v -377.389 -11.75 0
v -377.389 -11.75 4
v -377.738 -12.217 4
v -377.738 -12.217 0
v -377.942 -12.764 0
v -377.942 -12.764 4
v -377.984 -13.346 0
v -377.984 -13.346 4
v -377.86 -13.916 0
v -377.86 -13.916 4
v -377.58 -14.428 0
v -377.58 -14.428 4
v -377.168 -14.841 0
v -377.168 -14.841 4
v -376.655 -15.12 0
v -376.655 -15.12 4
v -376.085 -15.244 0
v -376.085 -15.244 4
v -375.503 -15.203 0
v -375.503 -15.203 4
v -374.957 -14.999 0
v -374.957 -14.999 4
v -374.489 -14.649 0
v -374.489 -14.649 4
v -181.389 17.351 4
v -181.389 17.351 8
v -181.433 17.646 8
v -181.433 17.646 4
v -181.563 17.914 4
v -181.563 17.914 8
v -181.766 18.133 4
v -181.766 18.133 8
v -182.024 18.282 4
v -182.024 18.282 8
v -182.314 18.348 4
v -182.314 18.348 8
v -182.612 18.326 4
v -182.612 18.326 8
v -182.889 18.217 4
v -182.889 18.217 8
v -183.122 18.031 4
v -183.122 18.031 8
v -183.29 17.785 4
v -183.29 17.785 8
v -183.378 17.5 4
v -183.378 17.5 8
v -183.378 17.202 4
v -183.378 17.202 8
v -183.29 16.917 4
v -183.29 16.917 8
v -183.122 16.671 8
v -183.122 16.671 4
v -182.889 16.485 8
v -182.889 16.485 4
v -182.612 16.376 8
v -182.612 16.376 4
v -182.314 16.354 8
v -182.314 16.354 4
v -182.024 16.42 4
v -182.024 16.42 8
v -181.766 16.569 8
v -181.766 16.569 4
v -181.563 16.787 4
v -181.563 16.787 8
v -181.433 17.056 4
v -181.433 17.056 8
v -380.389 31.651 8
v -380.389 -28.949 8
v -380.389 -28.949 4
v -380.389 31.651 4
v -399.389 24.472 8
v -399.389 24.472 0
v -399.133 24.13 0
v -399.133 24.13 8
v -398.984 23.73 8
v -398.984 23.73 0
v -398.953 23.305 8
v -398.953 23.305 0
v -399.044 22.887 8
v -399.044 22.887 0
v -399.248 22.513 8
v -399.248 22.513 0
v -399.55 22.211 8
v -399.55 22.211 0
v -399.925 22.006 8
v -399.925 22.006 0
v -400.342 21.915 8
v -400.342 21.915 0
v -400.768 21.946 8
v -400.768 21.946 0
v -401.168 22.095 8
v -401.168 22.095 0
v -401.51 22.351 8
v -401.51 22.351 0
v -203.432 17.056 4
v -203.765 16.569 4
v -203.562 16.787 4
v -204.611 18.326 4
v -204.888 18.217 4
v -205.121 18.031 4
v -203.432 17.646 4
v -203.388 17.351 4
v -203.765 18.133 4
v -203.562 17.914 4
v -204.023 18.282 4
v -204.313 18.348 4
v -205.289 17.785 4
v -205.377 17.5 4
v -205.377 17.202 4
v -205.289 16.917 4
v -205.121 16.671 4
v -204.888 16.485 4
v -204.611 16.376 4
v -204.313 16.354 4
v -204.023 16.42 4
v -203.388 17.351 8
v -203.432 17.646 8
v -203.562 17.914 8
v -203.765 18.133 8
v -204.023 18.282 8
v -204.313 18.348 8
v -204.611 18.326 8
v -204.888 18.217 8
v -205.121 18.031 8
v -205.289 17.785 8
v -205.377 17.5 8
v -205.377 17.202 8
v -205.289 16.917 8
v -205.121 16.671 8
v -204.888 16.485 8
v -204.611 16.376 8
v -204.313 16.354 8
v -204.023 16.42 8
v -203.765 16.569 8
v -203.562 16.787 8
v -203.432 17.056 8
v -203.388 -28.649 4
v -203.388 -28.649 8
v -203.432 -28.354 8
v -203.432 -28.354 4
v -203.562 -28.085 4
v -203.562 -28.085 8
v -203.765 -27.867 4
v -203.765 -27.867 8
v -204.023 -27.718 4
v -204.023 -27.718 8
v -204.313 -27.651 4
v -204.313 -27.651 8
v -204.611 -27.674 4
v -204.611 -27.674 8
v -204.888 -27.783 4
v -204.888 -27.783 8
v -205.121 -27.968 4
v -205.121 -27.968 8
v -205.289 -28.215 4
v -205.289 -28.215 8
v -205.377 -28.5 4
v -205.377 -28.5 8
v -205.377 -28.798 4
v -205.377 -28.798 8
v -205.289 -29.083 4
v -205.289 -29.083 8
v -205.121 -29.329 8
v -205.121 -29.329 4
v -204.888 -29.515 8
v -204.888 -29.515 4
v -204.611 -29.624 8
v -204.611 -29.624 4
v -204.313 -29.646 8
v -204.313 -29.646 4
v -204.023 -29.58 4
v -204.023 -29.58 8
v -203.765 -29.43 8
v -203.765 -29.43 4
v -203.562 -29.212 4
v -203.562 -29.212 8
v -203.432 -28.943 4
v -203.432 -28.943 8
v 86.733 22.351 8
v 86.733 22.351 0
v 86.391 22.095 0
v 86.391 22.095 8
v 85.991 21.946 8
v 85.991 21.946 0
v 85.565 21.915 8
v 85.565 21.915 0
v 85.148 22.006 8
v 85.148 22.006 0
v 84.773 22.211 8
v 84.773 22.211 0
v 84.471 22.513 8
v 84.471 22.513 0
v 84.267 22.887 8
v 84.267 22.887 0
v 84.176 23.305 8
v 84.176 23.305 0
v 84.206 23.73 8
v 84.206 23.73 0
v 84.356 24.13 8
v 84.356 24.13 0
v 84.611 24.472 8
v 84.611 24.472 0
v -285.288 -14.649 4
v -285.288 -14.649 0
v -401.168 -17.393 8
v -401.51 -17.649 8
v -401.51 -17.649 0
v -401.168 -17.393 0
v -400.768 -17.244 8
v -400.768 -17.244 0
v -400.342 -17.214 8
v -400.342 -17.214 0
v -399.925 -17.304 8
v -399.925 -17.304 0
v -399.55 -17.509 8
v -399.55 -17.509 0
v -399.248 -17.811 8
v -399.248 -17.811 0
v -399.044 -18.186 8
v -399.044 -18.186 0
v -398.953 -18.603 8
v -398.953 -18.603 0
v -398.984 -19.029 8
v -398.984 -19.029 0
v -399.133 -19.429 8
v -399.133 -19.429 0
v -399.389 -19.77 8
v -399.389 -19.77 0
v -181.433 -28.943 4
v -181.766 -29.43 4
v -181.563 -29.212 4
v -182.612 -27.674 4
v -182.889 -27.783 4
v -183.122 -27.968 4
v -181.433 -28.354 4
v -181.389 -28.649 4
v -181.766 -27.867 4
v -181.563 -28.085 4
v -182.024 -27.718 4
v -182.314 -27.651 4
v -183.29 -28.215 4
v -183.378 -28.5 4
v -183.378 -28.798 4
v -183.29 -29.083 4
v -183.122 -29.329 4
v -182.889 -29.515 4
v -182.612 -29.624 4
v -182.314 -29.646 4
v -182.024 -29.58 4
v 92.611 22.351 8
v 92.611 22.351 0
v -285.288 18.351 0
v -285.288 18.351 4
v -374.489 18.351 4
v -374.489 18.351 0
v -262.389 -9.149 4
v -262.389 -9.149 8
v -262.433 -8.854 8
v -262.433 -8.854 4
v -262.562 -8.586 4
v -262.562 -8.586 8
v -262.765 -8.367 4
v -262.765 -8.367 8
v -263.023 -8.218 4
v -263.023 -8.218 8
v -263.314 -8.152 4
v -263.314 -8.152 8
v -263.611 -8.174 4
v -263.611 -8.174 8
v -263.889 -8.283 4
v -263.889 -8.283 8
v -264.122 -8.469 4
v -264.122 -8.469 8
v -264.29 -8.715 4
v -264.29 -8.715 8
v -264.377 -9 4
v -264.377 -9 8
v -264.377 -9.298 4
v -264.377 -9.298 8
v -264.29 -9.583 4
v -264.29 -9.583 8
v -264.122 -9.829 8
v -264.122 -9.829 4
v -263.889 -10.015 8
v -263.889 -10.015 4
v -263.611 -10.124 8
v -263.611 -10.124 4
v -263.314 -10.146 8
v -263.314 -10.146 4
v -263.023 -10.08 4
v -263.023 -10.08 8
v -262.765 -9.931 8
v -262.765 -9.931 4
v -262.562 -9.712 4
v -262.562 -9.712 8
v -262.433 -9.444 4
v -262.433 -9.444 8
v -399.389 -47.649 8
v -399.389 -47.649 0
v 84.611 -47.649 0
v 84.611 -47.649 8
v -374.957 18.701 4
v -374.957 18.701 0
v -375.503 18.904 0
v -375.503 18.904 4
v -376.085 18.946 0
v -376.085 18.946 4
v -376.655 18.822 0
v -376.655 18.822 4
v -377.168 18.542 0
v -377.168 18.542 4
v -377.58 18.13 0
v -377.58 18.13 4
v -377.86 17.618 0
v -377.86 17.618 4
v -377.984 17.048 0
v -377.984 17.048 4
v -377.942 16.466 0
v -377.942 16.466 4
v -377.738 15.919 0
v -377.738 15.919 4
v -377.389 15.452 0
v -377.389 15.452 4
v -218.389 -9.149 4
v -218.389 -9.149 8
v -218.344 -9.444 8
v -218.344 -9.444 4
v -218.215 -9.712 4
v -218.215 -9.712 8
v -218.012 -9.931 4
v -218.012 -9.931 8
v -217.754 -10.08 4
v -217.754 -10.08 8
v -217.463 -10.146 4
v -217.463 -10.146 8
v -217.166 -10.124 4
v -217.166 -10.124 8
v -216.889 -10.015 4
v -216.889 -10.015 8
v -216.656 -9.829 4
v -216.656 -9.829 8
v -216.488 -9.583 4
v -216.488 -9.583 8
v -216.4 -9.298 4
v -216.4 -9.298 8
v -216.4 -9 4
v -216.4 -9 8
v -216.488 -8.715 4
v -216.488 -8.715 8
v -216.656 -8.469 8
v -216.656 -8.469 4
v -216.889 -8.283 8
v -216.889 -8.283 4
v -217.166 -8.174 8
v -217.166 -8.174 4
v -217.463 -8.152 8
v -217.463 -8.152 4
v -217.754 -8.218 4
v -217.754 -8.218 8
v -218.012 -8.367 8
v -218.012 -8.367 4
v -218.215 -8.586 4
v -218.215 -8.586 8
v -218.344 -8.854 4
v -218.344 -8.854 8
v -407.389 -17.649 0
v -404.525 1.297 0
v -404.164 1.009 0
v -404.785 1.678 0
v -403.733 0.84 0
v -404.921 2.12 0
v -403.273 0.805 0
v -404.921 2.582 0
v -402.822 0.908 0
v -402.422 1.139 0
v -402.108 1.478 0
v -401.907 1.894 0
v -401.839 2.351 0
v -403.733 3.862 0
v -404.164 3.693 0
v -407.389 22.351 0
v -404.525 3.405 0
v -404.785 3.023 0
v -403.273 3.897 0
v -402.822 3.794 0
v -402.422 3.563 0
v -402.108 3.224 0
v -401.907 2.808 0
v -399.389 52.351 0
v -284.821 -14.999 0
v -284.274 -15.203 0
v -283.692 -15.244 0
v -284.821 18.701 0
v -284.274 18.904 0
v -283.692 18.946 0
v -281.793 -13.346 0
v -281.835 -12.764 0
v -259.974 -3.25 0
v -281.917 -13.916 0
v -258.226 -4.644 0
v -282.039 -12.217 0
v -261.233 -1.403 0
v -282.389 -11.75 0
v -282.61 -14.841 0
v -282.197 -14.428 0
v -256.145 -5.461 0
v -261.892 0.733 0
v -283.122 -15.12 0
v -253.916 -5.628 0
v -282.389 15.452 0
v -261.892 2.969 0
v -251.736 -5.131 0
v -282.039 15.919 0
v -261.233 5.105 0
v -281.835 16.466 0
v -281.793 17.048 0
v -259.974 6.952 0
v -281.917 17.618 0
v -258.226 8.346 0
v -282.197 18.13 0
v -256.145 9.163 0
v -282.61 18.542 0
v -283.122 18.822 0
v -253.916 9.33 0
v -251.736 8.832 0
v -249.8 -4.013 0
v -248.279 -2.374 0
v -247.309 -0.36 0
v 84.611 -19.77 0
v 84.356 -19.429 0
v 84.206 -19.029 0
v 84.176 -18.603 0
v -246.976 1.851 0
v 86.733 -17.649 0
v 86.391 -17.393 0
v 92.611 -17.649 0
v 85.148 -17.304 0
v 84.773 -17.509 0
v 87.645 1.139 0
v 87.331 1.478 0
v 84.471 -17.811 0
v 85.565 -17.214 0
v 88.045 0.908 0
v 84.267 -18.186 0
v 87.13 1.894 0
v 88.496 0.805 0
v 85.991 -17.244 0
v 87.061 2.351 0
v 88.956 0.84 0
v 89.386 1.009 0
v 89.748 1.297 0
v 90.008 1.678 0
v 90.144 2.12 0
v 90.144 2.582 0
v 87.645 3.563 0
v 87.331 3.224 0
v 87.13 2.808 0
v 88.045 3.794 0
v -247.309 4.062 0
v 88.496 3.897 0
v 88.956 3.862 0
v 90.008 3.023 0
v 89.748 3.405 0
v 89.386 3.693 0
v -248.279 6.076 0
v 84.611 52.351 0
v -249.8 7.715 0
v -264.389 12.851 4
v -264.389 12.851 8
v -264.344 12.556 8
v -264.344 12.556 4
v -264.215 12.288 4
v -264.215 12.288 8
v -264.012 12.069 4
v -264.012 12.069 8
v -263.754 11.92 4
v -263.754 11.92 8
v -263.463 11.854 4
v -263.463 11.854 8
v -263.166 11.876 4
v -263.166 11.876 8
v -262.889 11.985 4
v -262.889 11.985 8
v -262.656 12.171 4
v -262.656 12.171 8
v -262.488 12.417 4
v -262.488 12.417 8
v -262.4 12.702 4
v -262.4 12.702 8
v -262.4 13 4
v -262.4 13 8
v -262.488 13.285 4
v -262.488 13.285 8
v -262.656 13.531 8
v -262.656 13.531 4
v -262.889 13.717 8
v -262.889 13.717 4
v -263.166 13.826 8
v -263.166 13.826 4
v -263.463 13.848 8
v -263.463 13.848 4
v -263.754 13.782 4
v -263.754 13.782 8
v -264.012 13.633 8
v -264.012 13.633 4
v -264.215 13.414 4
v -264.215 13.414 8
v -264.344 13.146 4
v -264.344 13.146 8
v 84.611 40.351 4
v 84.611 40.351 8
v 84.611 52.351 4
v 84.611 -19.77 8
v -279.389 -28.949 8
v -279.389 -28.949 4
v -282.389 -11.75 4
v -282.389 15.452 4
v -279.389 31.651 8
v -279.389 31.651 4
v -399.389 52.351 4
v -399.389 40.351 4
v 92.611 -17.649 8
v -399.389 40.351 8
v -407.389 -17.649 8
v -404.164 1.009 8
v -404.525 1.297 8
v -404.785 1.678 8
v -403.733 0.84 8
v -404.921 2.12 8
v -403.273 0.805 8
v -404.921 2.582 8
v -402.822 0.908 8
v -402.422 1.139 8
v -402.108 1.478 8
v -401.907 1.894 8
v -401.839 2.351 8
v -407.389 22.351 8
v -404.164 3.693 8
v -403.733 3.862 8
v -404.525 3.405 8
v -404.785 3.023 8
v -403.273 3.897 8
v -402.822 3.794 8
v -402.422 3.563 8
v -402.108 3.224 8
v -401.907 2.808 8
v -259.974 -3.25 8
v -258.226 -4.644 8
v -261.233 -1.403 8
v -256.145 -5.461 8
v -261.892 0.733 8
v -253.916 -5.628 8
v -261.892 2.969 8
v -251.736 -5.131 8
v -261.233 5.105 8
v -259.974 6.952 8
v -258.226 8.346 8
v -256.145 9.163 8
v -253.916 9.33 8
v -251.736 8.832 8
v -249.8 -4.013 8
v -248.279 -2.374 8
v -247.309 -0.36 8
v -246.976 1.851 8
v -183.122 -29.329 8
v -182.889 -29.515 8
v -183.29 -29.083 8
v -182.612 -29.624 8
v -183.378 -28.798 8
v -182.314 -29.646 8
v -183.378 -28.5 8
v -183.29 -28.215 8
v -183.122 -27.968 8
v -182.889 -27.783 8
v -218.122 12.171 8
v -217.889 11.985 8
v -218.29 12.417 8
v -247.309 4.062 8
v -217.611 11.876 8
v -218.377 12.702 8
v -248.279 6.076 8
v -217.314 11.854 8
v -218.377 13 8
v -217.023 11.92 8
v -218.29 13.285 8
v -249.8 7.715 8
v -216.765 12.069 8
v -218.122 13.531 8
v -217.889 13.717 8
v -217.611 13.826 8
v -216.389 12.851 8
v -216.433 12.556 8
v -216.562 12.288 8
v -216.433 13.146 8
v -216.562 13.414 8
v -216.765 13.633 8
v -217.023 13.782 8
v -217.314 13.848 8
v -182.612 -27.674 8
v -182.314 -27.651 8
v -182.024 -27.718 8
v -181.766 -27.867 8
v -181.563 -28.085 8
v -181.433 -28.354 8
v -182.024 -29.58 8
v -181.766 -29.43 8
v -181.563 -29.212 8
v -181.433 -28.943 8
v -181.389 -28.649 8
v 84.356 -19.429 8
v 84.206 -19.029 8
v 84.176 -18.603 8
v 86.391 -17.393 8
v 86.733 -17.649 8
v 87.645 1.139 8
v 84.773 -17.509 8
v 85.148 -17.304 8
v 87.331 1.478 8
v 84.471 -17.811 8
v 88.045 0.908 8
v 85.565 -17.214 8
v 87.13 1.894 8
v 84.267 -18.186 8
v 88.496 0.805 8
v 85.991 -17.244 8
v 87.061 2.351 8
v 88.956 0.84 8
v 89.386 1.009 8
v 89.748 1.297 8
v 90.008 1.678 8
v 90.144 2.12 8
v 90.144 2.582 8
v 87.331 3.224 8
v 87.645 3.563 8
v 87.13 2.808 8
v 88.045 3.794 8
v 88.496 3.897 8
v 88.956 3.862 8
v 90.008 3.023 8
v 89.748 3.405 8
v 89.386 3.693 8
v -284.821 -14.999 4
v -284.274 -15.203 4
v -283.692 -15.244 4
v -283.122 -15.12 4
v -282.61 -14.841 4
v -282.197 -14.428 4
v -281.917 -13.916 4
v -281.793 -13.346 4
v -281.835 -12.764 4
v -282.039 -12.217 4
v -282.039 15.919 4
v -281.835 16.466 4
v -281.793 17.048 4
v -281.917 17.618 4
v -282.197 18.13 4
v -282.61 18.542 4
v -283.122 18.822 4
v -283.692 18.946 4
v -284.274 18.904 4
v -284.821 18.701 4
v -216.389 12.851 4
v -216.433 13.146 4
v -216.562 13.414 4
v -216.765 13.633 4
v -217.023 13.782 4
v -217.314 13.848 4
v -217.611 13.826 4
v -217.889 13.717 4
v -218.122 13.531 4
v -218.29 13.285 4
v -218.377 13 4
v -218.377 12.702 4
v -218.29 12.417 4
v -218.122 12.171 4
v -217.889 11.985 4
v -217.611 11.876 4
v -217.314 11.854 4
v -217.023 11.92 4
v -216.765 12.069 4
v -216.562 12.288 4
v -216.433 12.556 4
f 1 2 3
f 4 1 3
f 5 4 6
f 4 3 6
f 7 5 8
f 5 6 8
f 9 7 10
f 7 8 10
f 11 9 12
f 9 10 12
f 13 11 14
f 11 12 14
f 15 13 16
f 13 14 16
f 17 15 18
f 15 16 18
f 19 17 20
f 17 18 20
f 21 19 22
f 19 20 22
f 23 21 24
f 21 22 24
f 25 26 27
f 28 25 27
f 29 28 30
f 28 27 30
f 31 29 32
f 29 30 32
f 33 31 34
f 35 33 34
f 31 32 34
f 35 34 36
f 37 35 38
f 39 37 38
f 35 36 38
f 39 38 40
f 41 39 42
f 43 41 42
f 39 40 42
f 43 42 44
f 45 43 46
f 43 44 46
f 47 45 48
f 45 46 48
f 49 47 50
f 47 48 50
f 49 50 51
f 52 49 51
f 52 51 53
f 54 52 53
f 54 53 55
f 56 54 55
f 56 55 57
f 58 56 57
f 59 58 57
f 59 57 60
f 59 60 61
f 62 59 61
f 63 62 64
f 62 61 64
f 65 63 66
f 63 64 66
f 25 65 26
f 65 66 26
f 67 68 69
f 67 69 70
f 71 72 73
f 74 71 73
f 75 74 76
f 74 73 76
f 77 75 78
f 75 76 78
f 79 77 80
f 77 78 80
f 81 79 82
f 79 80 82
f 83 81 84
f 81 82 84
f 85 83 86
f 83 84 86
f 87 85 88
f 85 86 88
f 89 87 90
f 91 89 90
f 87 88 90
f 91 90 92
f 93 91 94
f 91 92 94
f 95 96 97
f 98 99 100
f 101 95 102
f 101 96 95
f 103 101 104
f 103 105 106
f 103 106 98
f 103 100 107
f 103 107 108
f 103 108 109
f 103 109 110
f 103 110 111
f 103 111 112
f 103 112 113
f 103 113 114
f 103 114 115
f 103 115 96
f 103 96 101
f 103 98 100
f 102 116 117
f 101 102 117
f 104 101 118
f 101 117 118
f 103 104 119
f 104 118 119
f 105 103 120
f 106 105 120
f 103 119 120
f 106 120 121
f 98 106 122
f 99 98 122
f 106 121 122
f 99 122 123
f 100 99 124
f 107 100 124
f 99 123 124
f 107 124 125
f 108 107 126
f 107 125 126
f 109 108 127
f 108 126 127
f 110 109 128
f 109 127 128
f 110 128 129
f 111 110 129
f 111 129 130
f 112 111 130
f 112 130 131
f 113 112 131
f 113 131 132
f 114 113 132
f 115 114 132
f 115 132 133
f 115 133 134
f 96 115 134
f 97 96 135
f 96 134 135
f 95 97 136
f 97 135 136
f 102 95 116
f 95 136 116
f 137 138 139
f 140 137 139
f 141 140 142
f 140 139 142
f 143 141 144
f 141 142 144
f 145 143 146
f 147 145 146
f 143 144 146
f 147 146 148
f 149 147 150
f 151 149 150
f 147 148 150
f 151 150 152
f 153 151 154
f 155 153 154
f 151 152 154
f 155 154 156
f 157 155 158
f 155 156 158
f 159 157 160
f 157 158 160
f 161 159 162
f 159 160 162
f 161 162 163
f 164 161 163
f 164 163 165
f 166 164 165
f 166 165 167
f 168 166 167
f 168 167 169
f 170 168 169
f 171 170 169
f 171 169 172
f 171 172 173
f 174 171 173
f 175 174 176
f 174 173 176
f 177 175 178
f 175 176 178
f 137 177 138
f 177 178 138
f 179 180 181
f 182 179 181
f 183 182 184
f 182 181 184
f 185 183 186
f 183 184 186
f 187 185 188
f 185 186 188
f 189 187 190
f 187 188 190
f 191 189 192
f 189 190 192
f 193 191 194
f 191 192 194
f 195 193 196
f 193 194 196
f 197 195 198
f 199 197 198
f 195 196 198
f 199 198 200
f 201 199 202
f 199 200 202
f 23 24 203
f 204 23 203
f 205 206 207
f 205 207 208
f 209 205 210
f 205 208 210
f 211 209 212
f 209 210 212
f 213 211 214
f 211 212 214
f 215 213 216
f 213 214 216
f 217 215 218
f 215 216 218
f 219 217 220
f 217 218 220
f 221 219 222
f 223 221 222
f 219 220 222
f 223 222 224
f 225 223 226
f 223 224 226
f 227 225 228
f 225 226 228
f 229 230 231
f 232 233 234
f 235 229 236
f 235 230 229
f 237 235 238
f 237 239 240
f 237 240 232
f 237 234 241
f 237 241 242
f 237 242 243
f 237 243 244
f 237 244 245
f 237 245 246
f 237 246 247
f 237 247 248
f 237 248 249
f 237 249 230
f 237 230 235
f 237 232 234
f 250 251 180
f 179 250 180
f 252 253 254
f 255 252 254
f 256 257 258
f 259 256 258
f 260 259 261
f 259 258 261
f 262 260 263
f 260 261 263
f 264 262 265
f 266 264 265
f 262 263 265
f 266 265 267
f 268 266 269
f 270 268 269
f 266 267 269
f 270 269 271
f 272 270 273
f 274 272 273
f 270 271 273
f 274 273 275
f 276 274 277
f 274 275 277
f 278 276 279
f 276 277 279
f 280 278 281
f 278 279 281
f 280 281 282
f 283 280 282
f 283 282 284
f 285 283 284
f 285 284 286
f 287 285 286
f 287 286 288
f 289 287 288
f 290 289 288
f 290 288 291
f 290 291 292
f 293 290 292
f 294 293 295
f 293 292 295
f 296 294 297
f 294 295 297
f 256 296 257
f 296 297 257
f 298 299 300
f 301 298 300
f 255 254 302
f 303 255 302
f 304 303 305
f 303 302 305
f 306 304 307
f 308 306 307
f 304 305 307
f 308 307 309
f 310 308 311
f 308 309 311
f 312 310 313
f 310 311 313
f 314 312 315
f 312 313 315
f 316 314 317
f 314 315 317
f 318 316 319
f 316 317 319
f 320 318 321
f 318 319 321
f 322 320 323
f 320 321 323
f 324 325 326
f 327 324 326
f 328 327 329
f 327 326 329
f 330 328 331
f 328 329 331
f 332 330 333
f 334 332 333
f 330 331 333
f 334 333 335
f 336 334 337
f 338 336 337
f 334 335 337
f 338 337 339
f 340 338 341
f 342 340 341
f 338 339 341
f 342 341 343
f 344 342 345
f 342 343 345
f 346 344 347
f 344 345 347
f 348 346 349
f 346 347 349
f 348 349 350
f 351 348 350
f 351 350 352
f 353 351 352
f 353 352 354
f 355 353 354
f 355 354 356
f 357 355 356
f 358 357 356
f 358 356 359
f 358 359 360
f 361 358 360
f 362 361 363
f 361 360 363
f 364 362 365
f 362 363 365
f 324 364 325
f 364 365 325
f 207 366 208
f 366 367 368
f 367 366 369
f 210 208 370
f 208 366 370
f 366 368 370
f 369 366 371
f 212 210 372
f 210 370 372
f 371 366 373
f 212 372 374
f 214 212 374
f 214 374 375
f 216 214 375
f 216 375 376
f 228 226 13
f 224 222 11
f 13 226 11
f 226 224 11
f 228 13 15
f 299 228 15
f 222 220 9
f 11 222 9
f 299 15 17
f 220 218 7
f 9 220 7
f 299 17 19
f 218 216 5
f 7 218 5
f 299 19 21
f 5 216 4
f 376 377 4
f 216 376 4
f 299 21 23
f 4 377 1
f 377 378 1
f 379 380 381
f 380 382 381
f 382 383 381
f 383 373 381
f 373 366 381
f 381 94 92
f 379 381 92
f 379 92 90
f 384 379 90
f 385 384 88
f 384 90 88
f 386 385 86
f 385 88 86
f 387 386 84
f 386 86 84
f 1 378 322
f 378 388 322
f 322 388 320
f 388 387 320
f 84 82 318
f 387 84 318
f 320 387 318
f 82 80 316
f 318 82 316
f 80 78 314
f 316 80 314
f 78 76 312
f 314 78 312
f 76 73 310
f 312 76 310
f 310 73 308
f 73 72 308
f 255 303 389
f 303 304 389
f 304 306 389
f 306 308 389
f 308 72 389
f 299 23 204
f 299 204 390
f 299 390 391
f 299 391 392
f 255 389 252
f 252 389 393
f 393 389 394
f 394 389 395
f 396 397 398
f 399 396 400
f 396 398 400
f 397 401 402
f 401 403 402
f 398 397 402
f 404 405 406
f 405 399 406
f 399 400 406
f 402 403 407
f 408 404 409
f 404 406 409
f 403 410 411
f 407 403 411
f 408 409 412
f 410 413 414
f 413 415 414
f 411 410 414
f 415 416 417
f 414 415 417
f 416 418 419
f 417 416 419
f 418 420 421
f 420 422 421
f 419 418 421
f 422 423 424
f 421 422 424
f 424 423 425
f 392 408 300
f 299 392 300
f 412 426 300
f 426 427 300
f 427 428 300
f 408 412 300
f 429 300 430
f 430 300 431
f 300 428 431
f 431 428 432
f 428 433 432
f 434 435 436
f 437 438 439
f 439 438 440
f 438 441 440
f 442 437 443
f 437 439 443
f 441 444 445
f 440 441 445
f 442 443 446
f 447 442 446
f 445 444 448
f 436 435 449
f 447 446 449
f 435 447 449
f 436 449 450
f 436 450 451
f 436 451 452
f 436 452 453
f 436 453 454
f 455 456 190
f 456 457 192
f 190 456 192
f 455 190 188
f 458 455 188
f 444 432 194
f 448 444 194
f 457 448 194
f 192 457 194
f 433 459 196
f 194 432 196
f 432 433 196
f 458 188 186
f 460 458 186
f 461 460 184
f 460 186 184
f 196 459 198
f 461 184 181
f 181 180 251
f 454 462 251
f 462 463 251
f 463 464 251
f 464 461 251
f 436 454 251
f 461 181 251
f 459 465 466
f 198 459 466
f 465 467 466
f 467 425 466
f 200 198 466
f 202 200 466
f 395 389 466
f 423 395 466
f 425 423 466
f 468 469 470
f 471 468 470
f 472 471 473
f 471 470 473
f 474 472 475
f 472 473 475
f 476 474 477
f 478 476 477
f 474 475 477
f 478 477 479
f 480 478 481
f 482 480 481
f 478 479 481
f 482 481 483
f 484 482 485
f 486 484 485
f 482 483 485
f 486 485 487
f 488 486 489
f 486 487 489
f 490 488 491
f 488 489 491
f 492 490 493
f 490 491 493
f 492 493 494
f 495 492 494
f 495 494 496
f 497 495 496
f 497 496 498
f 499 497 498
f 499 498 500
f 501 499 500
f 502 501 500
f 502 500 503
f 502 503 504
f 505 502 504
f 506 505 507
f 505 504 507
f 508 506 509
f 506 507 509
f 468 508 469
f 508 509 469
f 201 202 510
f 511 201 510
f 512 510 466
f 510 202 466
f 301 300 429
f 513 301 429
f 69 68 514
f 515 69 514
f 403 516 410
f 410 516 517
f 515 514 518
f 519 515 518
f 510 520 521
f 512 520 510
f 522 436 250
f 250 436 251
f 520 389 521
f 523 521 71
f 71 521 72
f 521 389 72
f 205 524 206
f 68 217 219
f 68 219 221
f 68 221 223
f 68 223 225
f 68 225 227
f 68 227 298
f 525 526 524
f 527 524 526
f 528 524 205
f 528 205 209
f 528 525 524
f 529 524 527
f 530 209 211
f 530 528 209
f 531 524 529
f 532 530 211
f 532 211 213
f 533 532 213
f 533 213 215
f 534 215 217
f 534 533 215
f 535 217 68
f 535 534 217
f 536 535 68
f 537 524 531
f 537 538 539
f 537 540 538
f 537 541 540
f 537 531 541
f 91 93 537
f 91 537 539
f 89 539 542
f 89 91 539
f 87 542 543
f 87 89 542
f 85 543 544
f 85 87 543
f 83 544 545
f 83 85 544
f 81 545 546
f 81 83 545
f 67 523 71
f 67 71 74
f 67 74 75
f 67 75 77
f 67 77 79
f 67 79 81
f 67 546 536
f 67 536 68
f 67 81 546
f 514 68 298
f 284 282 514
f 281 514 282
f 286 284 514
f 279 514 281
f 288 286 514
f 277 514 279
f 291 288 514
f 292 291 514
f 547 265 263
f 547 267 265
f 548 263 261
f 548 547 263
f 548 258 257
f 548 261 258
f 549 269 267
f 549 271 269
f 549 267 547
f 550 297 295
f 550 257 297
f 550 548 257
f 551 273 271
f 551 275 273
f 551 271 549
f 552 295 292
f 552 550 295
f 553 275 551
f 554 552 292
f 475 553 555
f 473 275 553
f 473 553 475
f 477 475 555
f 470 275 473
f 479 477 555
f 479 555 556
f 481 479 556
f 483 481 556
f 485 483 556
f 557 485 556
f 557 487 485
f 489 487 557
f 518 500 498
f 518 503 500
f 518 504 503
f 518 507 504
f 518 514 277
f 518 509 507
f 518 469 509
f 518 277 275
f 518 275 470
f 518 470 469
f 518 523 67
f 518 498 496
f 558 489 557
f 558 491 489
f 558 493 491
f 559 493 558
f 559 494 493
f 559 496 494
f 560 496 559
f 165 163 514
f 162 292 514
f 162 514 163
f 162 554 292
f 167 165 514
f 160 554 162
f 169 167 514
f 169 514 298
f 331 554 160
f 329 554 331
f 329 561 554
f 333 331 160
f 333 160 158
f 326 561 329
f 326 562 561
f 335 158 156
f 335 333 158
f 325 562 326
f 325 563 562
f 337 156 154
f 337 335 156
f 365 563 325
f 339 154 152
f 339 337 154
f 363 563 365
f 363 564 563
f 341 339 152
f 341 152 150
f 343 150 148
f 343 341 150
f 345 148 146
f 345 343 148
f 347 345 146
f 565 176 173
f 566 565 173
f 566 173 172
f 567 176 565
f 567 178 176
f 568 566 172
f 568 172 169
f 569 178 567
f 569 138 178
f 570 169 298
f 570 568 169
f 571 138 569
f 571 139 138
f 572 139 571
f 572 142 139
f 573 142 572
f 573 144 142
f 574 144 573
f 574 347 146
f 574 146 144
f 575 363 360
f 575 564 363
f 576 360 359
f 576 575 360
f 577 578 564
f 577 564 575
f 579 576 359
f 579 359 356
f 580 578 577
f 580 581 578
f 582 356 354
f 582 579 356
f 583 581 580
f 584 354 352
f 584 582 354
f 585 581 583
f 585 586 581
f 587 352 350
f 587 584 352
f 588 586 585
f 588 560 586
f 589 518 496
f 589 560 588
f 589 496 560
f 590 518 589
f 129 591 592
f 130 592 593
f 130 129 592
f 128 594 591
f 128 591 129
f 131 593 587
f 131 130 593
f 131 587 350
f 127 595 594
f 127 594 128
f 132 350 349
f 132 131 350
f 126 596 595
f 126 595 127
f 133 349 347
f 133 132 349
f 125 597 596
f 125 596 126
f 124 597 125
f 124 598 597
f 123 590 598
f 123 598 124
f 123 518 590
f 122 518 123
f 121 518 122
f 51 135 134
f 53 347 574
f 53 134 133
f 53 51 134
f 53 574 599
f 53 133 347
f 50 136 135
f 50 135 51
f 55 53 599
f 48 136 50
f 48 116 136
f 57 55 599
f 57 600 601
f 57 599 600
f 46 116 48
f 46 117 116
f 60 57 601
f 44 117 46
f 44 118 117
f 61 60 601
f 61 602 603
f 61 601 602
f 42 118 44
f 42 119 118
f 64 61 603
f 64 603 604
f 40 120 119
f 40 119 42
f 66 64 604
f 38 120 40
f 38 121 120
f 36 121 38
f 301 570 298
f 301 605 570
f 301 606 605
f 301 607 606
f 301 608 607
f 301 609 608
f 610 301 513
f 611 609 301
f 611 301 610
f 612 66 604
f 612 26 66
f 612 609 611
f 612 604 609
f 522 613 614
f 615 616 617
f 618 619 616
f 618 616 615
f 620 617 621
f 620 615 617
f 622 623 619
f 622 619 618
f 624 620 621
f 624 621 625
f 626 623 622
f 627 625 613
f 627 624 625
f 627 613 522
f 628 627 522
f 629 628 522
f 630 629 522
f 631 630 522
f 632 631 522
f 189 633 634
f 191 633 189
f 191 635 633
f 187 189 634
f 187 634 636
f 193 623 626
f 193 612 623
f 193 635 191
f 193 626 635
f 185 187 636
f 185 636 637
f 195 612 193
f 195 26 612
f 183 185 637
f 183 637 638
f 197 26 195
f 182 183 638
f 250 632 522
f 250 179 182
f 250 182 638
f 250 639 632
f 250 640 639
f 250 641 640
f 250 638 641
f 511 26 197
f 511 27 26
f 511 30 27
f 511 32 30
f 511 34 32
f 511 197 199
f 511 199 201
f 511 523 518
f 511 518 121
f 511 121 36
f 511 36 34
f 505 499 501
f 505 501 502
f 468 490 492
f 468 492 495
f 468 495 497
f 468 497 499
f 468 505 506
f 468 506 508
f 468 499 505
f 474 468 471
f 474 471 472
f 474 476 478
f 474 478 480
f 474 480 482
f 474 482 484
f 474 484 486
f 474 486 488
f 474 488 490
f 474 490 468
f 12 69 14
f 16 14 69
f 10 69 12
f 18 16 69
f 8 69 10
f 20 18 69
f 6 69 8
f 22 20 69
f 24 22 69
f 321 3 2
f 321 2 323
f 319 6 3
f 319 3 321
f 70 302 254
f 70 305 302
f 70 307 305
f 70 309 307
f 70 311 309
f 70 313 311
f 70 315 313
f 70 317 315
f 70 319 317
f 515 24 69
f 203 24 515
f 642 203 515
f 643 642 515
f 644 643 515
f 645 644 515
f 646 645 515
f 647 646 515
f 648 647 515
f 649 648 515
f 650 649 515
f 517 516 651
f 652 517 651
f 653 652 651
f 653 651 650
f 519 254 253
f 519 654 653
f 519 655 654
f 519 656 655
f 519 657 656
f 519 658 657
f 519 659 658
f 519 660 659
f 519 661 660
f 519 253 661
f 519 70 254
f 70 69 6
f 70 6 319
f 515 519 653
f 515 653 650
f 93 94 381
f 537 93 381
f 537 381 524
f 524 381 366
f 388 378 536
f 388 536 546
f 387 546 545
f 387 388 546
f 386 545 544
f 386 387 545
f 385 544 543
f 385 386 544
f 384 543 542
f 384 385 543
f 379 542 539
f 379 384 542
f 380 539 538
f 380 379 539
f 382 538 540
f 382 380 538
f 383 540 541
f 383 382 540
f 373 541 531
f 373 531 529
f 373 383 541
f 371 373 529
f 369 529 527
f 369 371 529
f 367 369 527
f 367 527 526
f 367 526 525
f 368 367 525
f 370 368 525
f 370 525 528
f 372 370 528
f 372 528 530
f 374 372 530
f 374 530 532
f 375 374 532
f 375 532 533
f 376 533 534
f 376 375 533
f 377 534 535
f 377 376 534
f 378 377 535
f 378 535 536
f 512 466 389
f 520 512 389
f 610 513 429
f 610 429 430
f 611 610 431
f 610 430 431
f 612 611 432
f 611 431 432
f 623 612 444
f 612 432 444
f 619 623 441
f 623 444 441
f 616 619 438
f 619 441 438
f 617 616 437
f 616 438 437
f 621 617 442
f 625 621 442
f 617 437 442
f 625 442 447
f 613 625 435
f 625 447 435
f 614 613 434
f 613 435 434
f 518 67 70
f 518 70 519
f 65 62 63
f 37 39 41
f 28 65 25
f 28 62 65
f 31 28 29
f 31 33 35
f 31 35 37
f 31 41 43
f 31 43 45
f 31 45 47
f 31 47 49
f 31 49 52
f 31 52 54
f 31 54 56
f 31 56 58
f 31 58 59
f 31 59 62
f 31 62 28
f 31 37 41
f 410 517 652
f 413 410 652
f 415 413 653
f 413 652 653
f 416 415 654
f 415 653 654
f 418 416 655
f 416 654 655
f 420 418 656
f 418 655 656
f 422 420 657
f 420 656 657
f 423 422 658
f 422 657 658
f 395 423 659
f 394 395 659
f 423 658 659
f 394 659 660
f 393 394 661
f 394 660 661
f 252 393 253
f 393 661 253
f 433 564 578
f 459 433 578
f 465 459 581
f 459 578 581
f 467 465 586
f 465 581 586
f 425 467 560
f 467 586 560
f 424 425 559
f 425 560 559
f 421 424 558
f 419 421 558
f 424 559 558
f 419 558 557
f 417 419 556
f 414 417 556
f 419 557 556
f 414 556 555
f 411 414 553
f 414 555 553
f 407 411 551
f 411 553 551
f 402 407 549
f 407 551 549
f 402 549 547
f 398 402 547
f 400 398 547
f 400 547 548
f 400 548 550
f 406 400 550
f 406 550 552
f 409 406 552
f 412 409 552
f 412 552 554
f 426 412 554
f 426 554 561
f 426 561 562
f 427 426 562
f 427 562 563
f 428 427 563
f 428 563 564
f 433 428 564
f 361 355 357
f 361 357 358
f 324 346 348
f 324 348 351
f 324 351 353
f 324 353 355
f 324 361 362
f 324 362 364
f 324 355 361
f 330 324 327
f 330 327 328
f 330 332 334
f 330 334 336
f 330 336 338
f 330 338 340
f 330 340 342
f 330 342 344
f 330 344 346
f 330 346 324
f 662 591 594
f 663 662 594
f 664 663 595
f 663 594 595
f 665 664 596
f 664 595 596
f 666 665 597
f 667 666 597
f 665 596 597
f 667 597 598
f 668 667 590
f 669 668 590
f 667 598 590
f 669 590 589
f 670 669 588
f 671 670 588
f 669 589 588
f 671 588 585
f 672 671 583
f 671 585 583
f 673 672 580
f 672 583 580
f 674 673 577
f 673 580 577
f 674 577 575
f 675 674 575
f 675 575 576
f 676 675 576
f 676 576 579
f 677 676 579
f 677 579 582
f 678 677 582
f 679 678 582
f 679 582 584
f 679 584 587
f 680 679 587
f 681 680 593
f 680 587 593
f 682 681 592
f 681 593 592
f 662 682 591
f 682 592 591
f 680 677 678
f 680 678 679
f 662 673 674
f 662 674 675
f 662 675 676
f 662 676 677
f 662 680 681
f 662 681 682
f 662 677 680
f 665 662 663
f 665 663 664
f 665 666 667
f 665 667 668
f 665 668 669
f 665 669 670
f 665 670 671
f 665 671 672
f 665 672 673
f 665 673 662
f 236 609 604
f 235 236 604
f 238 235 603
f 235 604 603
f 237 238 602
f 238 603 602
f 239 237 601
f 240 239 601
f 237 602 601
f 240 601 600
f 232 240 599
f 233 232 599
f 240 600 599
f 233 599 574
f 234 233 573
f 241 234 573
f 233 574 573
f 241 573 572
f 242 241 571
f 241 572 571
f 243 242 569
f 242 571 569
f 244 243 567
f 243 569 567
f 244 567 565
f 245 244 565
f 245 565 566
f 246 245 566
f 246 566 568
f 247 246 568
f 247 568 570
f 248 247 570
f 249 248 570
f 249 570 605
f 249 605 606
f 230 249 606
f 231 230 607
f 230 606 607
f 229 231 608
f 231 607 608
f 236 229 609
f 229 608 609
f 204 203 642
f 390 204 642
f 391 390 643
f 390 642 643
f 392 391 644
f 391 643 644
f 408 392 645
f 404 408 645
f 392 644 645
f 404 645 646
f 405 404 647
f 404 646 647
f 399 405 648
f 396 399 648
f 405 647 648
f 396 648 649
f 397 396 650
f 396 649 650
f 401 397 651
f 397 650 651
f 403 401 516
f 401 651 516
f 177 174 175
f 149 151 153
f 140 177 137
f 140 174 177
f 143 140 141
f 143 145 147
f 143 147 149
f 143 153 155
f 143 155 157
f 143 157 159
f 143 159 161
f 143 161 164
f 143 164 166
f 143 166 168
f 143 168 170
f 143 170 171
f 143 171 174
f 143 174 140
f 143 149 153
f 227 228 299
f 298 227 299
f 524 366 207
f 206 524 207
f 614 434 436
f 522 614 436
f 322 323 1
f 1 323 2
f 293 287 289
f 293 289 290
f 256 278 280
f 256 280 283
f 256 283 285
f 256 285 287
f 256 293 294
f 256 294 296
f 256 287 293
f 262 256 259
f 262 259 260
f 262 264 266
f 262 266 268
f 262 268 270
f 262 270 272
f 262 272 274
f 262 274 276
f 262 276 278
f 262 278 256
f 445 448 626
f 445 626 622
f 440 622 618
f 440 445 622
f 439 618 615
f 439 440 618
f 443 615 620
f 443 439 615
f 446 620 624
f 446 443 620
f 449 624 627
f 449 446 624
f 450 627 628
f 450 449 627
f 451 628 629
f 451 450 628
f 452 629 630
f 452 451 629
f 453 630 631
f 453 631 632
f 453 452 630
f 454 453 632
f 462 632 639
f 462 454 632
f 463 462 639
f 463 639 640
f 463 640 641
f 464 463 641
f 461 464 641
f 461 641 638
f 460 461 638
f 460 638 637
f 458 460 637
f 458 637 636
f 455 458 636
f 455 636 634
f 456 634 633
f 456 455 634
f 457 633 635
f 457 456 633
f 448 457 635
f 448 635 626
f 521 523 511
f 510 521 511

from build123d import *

# Parameters (mm, degrees)
ESQUISSE1_R             = 1.55
BOSS_EXTRU_1_DEPTH      = 8
ESQUISSE2_W             = 508.684044726
ESQUISSE2_H             = 12
ENL_V_MAT_EXTRU_1_DEPTH = 4
ESQUISSE3_R             = 7.5
ENL_V_MAT_EXTRU_2_DEPTH = 10
ESQUISSE4_W             = 101
ESQUISSE4_H             = 60.6
ENL_V_MAT_EXTRU_3_DEPTH = 4
ESQUISSE5_R             = 1
ENL_V_MAT_EXTRU_4_DEPTH = 4


with BuildPart() as part:
    # Esquisse1 → Boss.-Extru.1 (new body)
    with BuildSketch(Plane.XY):
        with BuildLine():
            Line((-399.388568491, 52.350857253), (-399.388568491, 24.472177597))
            ThreePointArc((-399.388568491, 24.472177597), (-399.388568491, 22.350857253), (-401.509888834, 22.350857253))
            Line((-401.509888834, 22.350857253), (-407.388568491, 22.350857253))
            Line((-407.388568491, 22.350857253), (-407.388568491, -17.649142747))
            Line((-407.388568491, -17.649142747), (-401.509888834, -17.649142747))
            ThreePointArc((-401.509888834, -17.649142747), (-399.388568491, -17.649142747), (-399.388568491, -19.77046309))
            Line((-399.388568491, -19.77046309), (-399.388568491, -47.649142747))
            Line((-399.388568491, -47.649142747), (84.611431509, -47.649142747))
            Line((84.611431509, -47.649142747), (84.611431509, -19.77046309))
            ThreePointArc((84.611431509, -19.77046309), (84.611431509, -17.649142747), (86.732751853, -17.649142747))
            Line((86.732751853, -17.649142747), (92.611431509, -17.649142747))
            Line((92.611431509, -17.649142747), (92.611431509, 22.350857253))
            Line((92.611431509, 22.350857253), (86.732751853, 22.350857253))
            ThreePointArc((86.732751853, 22.350857253), (84.611431509, 22.350857253), (84.611431509, 24.472177597))
            Line((84.611431509, 24.472177597), (84.611431509, 52.350857253))
            Line((84.611431509, 52.350857253), (-399.388568491, 52.350857253))
        make_face()
        with Locations((-403.388568491, 2.350857253)):
            Circle(ESQUISSE1_R, mode=Mode.SUBTRACT)
        with Locations(Location((88.611431509, 2.350857253, 0), (0, 0, 180))):
            Circle(ESQUISSE1_R, mode=Mode.SUBTRACT)
    extrude(amount=BOSS_EXTRU_1_DEPTH)

    # Esquisse2 → Enlèv. mat.-Extru.1 (cut)
    with BuildSketch(Plane.XY.offset(8)):
        with Locations((-159.986239331, 46.350857253)):
            Rectangle(ESQUISSE2_W, ESQUISSE2_H)
    extrude(amount=-ENL_V_MAT_EXTRU_1_DEPTH, mode=Mode.SUBTRACT)

    # Esquisse3 → Enlèv. mat.-Extru.2 (cut)
    with BuildSketch(Plane.XY.offset(8)):
        with Locations((-254.476180512, 1.850857253)):
            Circle(ESQUISSE3_R)
        with BuildLine():
            Line((-374.489430688, -14.649142747), (-285.287706293, -14.649142747))
            ThreePointArc((-285.287706293, -14.649142747), (-282.388568491, -14.649142747), (-282.388568491, -11.750004944))
            Line((-282.388568491, -11.750004944), (-282.388568491, 15.45171945))
            ThreePointArc((-282.388568491, 15.45171945), (-282.388568491, 18.350857253), (-285.287706293, 18.350857253))
            Line((-285.287706293, 18.350857253), (-374.489430688, 18.350857253))
            ThreePointArc((-374.489430688, 18.350857253), (-377.388568491, 18.350857253), (-377.388568491, 15.45171945))
            Line((-377.388568491, 15.45171945), (-377.388568491, -11.750004944))
            ThreePointArc((-377.388568491, -11.750004944), (-377.388568491, -14.649142747), (-374.489430688, -14.649142747))
        make_face()
    extrude(amount=-ENL_V_MAT_EXTRU_2_DEPTH, mode=Mode.SUBTRACT)

    # Esquisse4 → Enlèv. mat.-Extru.3 (cut)
    with BuildSketch(Plane.XY.offset(8)):
        with Locations((-329.888568491, 1.350857253)):
            Rectangle(ESQUISSE4_W, ESQUISSE4_H)
    extrude(amount=-ENL_V_MAT_EXTRU_3_DEPTH, mode=Mode.SUBTRACT)

    # Esquisse5 → Enlèv. mat.-Extru.4 (cut)
    with BuildSketch(Plane.XY.offset(8)):
        with Locations((-263.388568491, -9.149142747)):
            Circle(ESQUISSE5_R)
        with Locations(Location((-263.388568491, 12.850857253, 0), (0, 0, 180))):
            Circle(ESQUISSE5_R)
        with Locations((-217.388568491, 12.850857253)):
            Circle(ESQUISSE5_R)
        with Locations(Location((-217.388568491, -9.149142747, 0), (0, 0, 180))):
            Circle(ESQUISSE5_R)
        with Locations((-204.388008491, 17.350757253)):
            Circle(ESQUISSE5_R)
        with Locations((-182.389068491, 17.350757253)):
            Circle(ESQUISSE5_R)
        with Locations((-204.388008491, -28.648642747)):
            Circle(ESQUISSE5_R)
        with Locations((-182.389068491, -28.648642747)):
            Circle(ESQUISSE5_R)
    extrude(amount=-ENL_V_MAT_EXTRU_4_DEPTH, mode=Mode.SUBTRACT)


solid = part.part
